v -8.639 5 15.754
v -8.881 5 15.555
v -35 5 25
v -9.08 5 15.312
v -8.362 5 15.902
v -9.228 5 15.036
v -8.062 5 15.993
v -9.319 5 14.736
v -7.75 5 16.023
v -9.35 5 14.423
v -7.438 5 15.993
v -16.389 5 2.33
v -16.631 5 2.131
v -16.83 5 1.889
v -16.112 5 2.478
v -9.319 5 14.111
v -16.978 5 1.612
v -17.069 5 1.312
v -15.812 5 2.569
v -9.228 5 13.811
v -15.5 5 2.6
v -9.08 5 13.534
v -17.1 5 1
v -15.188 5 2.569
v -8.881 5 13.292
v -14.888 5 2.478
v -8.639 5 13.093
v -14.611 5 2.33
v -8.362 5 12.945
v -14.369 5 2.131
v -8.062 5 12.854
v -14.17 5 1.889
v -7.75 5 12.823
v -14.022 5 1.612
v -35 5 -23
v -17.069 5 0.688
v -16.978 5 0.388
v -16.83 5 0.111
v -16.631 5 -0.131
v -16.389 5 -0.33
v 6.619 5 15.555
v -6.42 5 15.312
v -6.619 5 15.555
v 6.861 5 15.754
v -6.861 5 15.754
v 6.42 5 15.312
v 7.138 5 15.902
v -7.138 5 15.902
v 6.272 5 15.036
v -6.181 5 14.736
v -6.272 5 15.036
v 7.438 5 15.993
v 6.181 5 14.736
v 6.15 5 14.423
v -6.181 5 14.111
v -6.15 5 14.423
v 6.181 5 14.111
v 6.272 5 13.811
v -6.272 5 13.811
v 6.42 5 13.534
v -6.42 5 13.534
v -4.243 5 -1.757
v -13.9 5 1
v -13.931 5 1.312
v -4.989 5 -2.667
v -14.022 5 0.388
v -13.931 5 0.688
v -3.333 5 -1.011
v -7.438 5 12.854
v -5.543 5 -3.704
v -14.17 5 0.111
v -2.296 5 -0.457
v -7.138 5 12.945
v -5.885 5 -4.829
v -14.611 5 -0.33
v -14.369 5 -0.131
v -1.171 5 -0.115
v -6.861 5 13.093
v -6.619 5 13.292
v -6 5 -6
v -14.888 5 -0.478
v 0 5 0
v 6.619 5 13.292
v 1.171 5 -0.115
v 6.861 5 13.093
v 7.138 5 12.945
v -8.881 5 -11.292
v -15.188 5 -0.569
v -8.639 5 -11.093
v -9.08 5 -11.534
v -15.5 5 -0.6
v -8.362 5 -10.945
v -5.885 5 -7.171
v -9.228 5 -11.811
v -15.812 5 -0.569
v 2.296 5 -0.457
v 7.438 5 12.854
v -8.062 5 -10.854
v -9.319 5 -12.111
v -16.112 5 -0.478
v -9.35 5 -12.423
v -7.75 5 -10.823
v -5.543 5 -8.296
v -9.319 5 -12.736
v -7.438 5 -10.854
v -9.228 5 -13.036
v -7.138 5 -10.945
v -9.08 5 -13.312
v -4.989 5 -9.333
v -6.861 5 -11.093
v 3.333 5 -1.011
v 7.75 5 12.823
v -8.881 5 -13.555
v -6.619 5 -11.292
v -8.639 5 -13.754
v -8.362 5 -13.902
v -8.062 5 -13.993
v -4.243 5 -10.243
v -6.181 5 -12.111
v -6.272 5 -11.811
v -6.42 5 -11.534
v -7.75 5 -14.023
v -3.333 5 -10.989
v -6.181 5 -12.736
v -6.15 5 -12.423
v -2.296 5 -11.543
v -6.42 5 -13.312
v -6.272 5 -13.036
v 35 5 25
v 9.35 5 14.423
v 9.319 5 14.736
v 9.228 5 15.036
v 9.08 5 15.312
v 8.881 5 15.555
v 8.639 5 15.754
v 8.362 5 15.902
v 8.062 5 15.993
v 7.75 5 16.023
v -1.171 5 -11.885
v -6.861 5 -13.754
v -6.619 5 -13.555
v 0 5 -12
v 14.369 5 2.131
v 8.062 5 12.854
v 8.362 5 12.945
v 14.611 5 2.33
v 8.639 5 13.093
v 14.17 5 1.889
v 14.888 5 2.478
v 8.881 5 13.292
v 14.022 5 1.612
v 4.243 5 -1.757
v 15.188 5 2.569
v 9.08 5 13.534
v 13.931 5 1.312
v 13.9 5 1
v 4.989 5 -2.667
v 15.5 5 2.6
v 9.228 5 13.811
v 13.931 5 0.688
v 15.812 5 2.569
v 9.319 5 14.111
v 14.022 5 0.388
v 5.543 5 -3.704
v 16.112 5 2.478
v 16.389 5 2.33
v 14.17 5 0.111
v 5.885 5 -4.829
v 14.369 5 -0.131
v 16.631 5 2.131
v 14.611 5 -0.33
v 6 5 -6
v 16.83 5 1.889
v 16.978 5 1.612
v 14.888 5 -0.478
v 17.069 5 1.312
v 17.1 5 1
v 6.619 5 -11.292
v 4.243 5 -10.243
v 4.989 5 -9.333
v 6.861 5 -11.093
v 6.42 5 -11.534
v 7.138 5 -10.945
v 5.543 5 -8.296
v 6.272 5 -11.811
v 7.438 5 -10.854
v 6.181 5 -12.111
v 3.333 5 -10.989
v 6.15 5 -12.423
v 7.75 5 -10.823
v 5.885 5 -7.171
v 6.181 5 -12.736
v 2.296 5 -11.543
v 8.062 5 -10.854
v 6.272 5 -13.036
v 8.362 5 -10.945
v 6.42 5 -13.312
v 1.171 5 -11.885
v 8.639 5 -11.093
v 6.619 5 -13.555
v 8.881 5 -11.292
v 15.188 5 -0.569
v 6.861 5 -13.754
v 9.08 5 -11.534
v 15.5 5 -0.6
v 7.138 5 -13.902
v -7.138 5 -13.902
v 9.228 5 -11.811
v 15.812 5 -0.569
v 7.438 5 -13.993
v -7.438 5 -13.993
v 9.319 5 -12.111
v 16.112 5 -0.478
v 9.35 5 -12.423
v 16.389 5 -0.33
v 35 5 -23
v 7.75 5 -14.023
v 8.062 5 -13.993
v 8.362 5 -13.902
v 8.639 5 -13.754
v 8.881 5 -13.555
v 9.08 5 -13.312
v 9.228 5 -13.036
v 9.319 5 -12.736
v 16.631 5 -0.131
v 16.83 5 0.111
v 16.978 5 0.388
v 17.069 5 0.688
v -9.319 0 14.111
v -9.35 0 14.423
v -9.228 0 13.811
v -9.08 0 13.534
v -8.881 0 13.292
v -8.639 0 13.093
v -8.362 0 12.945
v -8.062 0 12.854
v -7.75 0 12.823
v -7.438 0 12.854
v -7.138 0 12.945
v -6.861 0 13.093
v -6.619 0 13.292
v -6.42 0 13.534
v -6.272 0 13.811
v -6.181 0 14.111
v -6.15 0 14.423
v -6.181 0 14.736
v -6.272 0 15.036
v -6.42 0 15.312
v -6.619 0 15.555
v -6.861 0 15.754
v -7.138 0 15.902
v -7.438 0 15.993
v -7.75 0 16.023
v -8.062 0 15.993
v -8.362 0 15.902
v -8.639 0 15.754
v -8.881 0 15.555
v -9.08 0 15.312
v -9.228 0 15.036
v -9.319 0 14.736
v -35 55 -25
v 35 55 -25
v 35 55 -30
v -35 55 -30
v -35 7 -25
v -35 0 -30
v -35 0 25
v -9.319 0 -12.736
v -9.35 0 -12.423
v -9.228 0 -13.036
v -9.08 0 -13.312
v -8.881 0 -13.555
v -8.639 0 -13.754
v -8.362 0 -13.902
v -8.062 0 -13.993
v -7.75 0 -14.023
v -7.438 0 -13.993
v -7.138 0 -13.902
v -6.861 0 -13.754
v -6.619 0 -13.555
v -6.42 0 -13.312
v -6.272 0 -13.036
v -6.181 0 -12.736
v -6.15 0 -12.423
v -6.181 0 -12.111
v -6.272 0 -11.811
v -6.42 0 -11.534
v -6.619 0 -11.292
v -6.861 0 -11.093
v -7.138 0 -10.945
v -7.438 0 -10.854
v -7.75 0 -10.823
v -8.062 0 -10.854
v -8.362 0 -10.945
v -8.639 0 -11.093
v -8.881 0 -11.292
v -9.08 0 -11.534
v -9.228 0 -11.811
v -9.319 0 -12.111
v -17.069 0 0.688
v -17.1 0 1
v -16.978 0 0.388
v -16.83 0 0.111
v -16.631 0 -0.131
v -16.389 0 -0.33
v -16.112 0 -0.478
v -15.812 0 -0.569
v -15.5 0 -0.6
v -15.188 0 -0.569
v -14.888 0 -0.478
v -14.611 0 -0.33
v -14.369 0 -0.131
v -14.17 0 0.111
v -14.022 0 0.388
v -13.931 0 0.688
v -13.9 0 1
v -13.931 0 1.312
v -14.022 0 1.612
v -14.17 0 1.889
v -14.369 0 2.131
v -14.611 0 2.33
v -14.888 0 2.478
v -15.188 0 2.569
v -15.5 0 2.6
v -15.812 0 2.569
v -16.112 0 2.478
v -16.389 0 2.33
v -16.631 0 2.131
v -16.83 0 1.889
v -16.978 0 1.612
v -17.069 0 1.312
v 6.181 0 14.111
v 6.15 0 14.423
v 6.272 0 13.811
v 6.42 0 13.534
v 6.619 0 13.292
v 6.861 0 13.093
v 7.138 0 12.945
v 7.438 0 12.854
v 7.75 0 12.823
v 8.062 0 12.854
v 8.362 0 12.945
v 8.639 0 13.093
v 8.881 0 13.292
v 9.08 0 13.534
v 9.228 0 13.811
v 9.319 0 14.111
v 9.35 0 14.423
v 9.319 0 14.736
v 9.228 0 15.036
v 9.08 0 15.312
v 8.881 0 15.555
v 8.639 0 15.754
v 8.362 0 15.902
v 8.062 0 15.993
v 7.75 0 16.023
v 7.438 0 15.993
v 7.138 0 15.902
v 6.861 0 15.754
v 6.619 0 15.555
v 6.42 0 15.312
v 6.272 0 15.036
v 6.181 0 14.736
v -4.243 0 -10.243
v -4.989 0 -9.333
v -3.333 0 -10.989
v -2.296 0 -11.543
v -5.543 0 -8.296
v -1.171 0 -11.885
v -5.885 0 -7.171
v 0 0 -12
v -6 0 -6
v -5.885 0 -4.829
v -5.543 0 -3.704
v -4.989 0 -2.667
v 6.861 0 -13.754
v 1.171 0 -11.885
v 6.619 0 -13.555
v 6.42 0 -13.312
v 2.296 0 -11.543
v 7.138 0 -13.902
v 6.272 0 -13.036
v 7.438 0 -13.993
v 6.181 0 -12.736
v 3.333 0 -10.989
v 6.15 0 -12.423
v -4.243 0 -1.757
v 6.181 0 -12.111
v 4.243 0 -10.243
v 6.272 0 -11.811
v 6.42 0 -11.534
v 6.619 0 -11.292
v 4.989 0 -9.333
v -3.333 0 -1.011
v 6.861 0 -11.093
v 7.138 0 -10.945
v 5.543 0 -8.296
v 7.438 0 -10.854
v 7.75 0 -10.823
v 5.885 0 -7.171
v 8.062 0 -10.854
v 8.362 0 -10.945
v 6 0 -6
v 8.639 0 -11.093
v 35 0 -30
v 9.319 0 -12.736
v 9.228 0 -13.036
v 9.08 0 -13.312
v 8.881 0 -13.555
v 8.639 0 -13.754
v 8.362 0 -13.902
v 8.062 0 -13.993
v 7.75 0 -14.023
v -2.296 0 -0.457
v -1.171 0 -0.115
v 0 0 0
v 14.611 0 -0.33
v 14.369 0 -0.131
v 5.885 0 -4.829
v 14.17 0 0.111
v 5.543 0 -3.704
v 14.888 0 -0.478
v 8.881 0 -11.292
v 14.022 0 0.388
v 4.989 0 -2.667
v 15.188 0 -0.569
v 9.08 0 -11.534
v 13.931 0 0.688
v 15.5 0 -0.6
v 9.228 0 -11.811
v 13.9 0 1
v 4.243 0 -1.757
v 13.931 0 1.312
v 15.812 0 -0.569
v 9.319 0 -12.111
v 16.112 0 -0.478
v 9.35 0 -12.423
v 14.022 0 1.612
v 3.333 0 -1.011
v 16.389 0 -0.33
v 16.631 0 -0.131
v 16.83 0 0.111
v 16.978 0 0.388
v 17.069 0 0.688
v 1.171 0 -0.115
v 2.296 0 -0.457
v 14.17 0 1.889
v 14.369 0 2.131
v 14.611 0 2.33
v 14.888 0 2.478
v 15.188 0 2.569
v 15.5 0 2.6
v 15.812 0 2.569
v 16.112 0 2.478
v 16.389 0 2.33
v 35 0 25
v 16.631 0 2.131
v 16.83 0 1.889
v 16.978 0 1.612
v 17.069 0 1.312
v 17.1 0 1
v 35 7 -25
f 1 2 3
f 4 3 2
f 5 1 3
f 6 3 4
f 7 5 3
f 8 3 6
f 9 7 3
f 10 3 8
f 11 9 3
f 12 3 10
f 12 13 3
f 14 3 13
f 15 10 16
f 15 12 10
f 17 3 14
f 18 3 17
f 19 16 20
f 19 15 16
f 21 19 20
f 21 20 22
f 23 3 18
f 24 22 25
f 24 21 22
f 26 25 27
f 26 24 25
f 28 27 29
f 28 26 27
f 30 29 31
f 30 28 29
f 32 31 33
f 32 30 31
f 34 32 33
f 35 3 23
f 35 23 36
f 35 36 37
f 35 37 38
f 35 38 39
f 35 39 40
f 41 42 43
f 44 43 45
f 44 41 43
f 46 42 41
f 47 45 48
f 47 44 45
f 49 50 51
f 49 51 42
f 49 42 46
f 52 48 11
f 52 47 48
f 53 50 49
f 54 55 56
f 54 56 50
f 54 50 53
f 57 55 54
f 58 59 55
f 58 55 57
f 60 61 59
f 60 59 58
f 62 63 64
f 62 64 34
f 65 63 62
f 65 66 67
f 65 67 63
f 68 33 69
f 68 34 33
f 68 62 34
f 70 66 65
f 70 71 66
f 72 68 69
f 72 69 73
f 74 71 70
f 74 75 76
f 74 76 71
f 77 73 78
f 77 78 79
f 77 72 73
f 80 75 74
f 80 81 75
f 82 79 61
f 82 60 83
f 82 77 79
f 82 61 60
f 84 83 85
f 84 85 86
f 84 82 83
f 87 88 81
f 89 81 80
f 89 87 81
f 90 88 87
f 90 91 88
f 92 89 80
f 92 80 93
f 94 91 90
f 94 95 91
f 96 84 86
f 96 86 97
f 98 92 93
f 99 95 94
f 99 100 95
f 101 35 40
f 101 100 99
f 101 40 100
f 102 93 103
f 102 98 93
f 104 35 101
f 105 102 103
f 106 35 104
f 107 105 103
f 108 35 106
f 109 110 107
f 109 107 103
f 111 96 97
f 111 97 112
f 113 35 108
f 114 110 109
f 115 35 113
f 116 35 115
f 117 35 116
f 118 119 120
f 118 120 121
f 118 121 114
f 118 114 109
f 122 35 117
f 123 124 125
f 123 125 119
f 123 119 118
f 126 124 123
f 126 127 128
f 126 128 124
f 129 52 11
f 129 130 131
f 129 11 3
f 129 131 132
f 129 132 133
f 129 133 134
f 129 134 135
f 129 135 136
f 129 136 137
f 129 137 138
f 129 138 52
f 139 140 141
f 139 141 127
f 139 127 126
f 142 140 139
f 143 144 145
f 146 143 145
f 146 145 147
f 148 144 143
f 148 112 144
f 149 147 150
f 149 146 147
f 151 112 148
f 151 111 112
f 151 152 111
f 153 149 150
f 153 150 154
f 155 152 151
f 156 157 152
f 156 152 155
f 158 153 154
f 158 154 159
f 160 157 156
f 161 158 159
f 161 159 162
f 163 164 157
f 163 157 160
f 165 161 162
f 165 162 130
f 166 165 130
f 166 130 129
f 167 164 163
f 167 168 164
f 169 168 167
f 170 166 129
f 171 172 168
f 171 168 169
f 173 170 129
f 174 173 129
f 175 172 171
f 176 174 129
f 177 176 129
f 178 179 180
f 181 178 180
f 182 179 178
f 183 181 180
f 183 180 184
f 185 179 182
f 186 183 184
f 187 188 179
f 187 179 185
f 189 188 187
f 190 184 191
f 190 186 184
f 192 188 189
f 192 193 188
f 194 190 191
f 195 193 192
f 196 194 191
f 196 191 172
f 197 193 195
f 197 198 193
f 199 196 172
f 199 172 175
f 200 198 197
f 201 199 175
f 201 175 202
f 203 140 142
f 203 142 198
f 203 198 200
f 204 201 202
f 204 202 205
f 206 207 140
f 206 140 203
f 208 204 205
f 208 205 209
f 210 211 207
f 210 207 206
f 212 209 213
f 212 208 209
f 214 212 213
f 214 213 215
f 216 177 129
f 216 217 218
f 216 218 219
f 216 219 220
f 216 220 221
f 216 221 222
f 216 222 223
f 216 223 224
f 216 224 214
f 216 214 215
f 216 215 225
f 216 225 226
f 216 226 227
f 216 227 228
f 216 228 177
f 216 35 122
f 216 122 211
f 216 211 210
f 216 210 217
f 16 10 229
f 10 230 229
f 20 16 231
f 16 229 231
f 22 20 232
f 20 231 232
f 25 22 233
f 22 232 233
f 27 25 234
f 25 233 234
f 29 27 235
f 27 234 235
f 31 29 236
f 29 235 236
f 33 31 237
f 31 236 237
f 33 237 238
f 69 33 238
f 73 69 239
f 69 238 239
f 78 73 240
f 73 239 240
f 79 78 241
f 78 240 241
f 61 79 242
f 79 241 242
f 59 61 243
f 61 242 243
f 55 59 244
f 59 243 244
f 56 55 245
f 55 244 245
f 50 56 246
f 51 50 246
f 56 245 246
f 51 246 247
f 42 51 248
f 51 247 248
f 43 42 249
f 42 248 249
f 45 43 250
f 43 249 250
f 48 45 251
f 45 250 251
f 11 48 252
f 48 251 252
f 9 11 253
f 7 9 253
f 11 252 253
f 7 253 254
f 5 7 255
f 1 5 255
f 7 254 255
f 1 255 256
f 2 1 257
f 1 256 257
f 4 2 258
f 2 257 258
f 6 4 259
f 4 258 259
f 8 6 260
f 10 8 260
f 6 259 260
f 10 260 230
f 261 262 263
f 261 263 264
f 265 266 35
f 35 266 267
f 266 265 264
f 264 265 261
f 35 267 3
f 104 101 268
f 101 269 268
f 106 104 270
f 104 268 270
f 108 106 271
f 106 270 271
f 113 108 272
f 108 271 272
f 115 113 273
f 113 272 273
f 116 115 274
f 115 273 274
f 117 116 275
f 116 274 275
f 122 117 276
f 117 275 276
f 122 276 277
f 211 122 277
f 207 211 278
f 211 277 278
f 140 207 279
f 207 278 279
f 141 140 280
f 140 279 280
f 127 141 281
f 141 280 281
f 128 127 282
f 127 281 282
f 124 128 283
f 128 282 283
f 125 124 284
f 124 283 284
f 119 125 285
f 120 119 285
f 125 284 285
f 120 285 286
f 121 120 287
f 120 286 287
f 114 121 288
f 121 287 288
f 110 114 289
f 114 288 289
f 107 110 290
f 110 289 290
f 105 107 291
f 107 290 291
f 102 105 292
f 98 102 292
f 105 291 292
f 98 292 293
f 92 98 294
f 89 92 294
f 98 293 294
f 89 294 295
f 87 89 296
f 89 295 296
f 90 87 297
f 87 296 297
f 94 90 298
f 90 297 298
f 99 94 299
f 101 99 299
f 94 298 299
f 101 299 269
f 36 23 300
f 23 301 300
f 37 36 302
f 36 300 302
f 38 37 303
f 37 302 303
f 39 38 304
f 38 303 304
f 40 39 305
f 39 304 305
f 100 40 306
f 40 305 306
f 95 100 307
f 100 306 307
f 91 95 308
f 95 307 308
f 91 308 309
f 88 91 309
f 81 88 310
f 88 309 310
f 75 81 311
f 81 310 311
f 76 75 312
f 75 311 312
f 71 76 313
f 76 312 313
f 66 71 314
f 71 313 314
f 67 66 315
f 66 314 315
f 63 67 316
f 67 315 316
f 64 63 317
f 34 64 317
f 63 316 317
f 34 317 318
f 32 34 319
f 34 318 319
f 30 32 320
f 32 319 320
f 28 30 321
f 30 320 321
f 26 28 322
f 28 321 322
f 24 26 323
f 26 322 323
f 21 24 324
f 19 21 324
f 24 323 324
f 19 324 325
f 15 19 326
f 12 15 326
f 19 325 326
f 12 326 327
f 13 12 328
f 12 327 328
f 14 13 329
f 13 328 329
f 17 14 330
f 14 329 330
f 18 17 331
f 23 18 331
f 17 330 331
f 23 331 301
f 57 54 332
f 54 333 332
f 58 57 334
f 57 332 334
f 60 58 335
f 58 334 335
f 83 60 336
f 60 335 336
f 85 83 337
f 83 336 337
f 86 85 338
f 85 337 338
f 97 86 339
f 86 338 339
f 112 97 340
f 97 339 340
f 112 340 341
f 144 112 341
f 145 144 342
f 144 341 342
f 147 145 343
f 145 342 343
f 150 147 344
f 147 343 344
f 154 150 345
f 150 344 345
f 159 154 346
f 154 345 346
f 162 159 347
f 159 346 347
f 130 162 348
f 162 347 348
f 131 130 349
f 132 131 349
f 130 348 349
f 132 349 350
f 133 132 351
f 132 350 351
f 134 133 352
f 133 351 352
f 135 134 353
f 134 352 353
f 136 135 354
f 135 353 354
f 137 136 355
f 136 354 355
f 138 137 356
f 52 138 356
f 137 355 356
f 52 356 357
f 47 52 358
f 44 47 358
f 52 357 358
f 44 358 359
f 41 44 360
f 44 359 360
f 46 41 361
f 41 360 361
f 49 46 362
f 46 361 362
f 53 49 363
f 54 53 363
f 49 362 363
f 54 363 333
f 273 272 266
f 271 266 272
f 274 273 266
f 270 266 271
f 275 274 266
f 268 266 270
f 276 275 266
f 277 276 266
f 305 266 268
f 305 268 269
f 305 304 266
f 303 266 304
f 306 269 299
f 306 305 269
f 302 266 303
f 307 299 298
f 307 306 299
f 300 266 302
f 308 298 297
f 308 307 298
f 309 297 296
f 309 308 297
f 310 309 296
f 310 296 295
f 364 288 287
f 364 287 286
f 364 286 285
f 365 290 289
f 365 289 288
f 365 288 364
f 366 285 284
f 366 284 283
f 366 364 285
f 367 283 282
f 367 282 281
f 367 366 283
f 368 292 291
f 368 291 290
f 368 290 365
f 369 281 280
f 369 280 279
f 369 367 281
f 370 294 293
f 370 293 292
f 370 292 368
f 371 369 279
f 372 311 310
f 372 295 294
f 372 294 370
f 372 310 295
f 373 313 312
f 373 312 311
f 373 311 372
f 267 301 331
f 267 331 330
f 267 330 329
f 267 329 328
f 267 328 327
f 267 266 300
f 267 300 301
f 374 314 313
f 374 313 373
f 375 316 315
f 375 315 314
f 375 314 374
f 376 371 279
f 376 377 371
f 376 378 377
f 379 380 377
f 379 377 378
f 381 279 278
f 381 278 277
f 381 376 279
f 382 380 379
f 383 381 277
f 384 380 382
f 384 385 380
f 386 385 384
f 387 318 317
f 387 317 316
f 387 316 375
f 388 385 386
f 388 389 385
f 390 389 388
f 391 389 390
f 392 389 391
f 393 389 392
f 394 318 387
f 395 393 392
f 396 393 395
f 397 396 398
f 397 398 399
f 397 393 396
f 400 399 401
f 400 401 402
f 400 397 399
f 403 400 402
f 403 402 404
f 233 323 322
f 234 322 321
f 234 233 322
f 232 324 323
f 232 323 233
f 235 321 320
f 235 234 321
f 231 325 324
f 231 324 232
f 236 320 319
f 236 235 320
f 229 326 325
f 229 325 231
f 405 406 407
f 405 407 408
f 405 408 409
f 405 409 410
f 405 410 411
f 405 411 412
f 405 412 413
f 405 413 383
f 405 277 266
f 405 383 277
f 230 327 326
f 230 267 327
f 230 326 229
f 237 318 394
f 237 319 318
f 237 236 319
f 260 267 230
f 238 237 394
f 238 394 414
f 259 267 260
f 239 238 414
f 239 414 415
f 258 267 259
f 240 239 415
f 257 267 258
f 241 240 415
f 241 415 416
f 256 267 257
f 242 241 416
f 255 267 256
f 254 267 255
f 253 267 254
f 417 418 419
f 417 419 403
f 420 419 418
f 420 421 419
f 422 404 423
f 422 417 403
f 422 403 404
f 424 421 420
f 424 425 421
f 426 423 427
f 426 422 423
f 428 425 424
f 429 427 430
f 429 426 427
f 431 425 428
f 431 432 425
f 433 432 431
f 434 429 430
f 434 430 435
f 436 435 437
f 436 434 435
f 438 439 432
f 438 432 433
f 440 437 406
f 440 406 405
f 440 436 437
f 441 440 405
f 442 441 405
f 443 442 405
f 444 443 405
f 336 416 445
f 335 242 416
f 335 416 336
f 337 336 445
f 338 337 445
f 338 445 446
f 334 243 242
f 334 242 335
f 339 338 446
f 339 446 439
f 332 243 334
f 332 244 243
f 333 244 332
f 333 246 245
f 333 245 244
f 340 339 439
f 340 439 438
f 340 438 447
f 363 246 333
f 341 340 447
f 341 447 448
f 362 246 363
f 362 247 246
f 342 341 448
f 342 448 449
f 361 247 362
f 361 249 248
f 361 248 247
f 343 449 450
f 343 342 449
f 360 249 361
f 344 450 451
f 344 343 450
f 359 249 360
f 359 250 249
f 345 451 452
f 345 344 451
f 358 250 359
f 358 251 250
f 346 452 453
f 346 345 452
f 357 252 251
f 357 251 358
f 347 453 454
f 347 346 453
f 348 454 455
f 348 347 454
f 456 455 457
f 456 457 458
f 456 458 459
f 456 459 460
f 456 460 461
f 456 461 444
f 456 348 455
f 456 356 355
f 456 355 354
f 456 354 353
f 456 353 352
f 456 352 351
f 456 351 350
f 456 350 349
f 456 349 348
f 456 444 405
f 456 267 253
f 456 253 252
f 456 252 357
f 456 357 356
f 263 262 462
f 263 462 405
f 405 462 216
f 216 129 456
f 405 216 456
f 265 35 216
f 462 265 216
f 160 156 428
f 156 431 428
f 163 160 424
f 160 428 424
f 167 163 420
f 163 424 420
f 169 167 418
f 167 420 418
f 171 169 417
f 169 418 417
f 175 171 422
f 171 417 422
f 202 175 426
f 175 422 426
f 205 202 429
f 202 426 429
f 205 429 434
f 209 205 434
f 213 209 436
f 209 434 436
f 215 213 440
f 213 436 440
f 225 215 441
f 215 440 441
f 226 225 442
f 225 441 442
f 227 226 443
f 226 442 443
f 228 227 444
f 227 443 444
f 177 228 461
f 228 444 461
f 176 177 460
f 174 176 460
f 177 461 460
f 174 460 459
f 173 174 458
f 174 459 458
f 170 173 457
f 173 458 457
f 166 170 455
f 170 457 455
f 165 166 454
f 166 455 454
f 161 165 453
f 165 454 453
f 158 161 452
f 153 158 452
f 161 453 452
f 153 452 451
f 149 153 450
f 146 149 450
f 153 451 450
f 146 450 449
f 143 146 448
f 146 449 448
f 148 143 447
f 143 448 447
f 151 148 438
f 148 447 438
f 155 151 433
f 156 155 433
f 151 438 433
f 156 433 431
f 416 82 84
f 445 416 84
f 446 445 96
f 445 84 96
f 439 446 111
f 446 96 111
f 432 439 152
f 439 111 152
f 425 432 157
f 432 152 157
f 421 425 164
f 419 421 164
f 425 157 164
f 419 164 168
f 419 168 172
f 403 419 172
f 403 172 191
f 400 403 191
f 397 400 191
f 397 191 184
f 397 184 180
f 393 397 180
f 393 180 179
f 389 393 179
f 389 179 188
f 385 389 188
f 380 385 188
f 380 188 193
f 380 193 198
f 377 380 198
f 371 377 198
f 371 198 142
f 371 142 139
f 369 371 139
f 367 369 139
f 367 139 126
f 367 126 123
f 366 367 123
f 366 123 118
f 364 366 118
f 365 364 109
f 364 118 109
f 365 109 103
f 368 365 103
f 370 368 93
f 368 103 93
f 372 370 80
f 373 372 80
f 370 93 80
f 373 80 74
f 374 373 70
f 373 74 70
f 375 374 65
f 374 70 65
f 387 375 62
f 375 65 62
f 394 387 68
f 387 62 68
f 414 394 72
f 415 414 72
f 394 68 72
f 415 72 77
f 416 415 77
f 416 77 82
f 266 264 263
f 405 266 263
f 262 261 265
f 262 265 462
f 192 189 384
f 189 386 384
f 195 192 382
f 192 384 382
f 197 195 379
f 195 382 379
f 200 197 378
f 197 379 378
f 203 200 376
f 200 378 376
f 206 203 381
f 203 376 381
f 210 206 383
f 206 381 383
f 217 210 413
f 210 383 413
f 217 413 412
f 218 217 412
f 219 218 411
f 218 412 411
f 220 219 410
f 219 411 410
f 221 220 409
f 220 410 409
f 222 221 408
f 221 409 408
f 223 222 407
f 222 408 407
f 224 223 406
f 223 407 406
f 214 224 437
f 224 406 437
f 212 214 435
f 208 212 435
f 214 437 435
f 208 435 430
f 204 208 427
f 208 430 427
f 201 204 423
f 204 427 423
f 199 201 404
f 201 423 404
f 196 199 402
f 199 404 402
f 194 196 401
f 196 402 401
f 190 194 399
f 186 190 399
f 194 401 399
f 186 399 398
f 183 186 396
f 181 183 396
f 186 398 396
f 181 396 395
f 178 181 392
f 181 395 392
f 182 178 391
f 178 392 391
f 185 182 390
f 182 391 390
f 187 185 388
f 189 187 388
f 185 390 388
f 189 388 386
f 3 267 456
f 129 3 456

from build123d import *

# Parameters (mm, degrees)
SZKIC2_W                    = 70
SZKIC2_H                    = 50
DODANIE_WYCI_GNI_CIE1_DEPTH = 5
OTW_R_3_2_3_2_1_D           = 3.2
OTW_R_3_2_3_2_1_DEPTH       = 5
OTW_R_3_2_3_2_1_TIP         = 0.96137699
WYTNIJ_WYCI_GNI_CIE1_REACH  = 45.301
SZKIC7_R                    = 6
DODANIE_WYCI_GNI_CIE2_DEPTH = 5
SFAZOWANIE1_SIZE            = 2


with BuildPart() as part:
    # Szkic2 → Dodanie-wyciągnięcie1 (new body)
    with BuildSketch(Plane(origin=(0, 0, 0), x_dir=(1, 0, 0), z_dir=(0, 1, 0))):
        Rectangle(SZKIC2_W, SZKIC2_H)
    extrude(amount=DODANIE_WYCI_GNI_CIE1_DEPTH)

    # Otwór Ø3.2 (3.2)1
    with Locations(Plane(origin=(0, 5, 0), x_dir=(1, 0, 0), z_dir=(0, 1, 0))):
        with Locations((-7.75, -14.423393759), (7.75, -14.423393759), (15.5, -1), (7.75, 12.423393759), (-7.75, 12.423393759), (-15.5, -1)):
            Hole(OTW_R_3_2_3_2_1_D / 2, depth=OTW_R_3_2_3_2_1_DEPTH)
            with Locations((0, 0, -(OTW_R_3_2_3_2_1_DEPTH + OTW_R_3_2_3_2_1_TIP / 2))):  # 118° drill point
                Cone(0, OTW_R_3_2_3_2_1_D / 2, OTW_R_3_2_3_2_1_TIP, mode=Mode.SUBTRACT)

    # Szkic7 → Wytnij-wyciągnięcie1 (cut, up to next)
    with BuildSketch(Plane(origin=(0, 5, 0), x_dir=(1, 0, 0), z_dir=(0, 1, 0)), mode=Mode.PRIVATE) as wytnij_wyci_gni_cie1_sk1:
        with Locations(Location((0, 6, 0), (0, 0, 270))):
            Circle(SZKIC7_R)
    wytnij_wyci_gni_cie1_tool1 = extrude(wytnij_wyci_gni_cie1_sk1.sketch, amount=-WYTNIJ_WYCI_GNI_CIE1_REACH, mode=Mode.PRIVATE) & part.part
    add(wytnij_wyci_gni_cie1_tool1.solids().sort_by_distance((0, 5, -6))[0], mode=Mode.SUBTRACT)

    # Szkic8 → Dodanie-wyciągnięcie2 (add)
    with BuildSketch(Plane(origin=(0, 0, -25), x_dir=(-1, 0, 0), z_dir=(0, 0, -1))):
        Polygon((-35, 5), (-35, 55), (35, 55), (35, 5), (35, 0), (-35, 0), align=None)
    extrude(amount=DODANIE_WYCI_GNI_CIE2_DEPTH)

    # Sfazowanie1
    sfazowanie1_edges = [part.edges().sort_by_distance(p)[0] for p in [
        (0, 5, -25),
    ]]
    chamfer(sfazowanie1_edges, length=SFAZOWANIE1_SIZE)


solid = part.part
